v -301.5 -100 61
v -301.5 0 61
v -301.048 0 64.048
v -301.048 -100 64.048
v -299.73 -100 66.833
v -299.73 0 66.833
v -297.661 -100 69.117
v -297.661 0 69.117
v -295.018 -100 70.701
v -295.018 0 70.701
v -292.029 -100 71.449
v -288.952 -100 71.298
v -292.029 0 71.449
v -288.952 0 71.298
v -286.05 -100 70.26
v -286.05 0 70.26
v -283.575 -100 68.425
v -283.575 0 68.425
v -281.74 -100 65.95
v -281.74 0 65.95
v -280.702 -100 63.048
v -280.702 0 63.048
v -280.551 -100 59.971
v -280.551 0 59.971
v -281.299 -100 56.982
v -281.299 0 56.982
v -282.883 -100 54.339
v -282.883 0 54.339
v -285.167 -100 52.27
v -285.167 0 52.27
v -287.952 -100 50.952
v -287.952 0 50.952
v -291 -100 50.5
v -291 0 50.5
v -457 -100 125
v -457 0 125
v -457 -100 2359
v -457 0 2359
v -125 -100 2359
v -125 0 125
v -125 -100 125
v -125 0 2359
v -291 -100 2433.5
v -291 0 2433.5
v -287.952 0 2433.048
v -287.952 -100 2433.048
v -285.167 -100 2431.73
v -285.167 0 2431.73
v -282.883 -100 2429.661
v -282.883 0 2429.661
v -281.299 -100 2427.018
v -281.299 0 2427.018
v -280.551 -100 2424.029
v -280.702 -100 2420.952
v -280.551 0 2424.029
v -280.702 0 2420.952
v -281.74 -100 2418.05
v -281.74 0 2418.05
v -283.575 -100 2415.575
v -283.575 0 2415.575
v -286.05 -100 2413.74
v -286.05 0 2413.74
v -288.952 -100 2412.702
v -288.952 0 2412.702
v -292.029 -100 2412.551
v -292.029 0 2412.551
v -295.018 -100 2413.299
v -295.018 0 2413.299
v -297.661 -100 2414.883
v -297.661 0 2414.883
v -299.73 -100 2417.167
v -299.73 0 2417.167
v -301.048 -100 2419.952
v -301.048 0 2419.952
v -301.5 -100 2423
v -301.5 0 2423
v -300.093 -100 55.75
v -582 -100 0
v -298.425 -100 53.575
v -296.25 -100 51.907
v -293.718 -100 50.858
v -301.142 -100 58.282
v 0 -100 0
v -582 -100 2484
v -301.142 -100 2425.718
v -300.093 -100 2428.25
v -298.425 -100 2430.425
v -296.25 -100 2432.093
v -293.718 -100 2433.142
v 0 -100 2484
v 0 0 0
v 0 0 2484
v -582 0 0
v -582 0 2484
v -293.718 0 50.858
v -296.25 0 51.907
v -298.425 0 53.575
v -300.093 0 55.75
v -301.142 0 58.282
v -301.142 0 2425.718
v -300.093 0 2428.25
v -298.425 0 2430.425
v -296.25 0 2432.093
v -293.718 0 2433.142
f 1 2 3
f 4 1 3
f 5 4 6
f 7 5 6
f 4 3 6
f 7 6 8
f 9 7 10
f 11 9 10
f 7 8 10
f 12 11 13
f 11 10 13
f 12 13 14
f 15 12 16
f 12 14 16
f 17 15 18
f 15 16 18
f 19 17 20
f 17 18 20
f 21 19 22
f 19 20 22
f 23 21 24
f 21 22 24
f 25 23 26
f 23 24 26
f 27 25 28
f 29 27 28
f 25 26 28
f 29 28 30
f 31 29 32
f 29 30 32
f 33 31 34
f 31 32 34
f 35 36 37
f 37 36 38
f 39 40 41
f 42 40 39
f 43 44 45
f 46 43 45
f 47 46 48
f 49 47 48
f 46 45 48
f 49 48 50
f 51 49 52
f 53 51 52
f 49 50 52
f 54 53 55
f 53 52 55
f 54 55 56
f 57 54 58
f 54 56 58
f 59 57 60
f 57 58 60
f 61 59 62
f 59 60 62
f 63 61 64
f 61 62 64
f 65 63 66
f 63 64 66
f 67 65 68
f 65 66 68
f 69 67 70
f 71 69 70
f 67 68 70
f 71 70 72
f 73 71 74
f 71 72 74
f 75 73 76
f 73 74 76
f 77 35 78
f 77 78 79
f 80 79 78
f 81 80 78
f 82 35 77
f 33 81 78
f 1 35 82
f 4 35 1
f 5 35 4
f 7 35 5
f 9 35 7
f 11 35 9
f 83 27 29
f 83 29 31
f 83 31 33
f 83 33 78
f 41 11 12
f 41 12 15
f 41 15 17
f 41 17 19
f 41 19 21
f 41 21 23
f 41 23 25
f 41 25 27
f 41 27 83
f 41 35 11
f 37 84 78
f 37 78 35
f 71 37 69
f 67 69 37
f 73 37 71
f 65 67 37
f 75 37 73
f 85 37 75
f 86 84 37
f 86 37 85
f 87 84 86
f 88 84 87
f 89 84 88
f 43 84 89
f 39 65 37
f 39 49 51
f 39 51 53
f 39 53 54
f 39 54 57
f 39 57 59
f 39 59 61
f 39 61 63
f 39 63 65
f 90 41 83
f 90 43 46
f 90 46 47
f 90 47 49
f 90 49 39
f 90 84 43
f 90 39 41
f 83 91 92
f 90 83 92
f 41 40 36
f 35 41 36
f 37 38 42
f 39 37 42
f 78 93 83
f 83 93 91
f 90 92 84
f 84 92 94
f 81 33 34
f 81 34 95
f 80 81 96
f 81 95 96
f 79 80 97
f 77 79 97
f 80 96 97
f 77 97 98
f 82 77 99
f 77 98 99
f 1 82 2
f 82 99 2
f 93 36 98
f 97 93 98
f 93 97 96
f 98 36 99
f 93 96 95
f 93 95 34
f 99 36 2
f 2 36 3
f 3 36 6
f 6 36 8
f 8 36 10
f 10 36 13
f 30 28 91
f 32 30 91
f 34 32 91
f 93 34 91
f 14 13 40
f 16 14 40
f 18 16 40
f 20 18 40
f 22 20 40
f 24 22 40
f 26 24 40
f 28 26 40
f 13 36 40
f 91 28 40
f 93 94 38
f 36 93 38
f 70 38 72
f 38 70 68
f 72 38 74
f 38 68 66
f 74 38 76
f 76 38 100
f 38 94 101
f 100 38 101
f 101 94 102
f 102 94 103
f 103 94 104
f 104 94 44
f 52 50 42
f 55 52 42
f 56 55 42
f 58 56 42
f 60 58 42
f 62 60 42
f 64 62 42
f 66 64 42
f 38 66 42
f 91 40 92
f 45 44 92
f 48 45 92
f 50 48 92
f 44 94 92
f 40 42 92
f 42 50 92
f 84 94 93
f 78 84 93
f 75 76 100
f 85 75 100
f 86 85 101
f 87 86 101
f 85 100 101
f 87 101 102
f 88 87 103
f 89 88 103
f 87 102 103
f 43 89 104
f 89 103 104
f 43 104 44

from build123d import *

# Parameters (mm, degrees)
F0_W     = 125
F0_H     = 2234
F1_DEPTH = 100
F3_DEPTH = 100.001


with BuildPart() as f1:
    # F0 (on Front) → F1 (new body)
    with BuildSketch(Plane.XZ):
        Polygon((-582, 0), (0, 0), (0, 125), (-125, 125), (-457, 125), (-582, 125), align=None)
        with Locations((-62.5, 1242)):
            Rectangle(F0_W, F0_H)
        with Locations((-519.5, 1242)):
            Rectangle(F0_W, F0_H)
        Polygon((-125, 2359), (0, 2359), (0, 2484), (-582, 2484), (-582, 2359), (-457, 2359), align=None)
    extrude(amount=F1_DEPTH)

    # F2 (on face) → F3 (cut, through all)
    with BuildSketch(Plane(origin=(0, 0, 0), x_dir=(-1, 0, 0), z_dir=(0, 1, 0))):
        with BuildLine():
            ThreePointArc((291, 2433.5), (283.575379, 2415.575379), (301.5, 2423))
            ThreePointArc((301.5, 2423), (298.424621, 2430.424621), (291, 2433.5))
        make_face()
        with BuildLine():
            ThreePointArc((291, 50.5), (298.424621, 53.575379), (301.5, 61))
            ThreePointArc((301.5, 61), (283.575379, 68.424621), (291, 50.5))
        make_face()
    extrude(amount=-F3_DEPTH, mode=Mode.SUBTRACT)


solid = f1.part
